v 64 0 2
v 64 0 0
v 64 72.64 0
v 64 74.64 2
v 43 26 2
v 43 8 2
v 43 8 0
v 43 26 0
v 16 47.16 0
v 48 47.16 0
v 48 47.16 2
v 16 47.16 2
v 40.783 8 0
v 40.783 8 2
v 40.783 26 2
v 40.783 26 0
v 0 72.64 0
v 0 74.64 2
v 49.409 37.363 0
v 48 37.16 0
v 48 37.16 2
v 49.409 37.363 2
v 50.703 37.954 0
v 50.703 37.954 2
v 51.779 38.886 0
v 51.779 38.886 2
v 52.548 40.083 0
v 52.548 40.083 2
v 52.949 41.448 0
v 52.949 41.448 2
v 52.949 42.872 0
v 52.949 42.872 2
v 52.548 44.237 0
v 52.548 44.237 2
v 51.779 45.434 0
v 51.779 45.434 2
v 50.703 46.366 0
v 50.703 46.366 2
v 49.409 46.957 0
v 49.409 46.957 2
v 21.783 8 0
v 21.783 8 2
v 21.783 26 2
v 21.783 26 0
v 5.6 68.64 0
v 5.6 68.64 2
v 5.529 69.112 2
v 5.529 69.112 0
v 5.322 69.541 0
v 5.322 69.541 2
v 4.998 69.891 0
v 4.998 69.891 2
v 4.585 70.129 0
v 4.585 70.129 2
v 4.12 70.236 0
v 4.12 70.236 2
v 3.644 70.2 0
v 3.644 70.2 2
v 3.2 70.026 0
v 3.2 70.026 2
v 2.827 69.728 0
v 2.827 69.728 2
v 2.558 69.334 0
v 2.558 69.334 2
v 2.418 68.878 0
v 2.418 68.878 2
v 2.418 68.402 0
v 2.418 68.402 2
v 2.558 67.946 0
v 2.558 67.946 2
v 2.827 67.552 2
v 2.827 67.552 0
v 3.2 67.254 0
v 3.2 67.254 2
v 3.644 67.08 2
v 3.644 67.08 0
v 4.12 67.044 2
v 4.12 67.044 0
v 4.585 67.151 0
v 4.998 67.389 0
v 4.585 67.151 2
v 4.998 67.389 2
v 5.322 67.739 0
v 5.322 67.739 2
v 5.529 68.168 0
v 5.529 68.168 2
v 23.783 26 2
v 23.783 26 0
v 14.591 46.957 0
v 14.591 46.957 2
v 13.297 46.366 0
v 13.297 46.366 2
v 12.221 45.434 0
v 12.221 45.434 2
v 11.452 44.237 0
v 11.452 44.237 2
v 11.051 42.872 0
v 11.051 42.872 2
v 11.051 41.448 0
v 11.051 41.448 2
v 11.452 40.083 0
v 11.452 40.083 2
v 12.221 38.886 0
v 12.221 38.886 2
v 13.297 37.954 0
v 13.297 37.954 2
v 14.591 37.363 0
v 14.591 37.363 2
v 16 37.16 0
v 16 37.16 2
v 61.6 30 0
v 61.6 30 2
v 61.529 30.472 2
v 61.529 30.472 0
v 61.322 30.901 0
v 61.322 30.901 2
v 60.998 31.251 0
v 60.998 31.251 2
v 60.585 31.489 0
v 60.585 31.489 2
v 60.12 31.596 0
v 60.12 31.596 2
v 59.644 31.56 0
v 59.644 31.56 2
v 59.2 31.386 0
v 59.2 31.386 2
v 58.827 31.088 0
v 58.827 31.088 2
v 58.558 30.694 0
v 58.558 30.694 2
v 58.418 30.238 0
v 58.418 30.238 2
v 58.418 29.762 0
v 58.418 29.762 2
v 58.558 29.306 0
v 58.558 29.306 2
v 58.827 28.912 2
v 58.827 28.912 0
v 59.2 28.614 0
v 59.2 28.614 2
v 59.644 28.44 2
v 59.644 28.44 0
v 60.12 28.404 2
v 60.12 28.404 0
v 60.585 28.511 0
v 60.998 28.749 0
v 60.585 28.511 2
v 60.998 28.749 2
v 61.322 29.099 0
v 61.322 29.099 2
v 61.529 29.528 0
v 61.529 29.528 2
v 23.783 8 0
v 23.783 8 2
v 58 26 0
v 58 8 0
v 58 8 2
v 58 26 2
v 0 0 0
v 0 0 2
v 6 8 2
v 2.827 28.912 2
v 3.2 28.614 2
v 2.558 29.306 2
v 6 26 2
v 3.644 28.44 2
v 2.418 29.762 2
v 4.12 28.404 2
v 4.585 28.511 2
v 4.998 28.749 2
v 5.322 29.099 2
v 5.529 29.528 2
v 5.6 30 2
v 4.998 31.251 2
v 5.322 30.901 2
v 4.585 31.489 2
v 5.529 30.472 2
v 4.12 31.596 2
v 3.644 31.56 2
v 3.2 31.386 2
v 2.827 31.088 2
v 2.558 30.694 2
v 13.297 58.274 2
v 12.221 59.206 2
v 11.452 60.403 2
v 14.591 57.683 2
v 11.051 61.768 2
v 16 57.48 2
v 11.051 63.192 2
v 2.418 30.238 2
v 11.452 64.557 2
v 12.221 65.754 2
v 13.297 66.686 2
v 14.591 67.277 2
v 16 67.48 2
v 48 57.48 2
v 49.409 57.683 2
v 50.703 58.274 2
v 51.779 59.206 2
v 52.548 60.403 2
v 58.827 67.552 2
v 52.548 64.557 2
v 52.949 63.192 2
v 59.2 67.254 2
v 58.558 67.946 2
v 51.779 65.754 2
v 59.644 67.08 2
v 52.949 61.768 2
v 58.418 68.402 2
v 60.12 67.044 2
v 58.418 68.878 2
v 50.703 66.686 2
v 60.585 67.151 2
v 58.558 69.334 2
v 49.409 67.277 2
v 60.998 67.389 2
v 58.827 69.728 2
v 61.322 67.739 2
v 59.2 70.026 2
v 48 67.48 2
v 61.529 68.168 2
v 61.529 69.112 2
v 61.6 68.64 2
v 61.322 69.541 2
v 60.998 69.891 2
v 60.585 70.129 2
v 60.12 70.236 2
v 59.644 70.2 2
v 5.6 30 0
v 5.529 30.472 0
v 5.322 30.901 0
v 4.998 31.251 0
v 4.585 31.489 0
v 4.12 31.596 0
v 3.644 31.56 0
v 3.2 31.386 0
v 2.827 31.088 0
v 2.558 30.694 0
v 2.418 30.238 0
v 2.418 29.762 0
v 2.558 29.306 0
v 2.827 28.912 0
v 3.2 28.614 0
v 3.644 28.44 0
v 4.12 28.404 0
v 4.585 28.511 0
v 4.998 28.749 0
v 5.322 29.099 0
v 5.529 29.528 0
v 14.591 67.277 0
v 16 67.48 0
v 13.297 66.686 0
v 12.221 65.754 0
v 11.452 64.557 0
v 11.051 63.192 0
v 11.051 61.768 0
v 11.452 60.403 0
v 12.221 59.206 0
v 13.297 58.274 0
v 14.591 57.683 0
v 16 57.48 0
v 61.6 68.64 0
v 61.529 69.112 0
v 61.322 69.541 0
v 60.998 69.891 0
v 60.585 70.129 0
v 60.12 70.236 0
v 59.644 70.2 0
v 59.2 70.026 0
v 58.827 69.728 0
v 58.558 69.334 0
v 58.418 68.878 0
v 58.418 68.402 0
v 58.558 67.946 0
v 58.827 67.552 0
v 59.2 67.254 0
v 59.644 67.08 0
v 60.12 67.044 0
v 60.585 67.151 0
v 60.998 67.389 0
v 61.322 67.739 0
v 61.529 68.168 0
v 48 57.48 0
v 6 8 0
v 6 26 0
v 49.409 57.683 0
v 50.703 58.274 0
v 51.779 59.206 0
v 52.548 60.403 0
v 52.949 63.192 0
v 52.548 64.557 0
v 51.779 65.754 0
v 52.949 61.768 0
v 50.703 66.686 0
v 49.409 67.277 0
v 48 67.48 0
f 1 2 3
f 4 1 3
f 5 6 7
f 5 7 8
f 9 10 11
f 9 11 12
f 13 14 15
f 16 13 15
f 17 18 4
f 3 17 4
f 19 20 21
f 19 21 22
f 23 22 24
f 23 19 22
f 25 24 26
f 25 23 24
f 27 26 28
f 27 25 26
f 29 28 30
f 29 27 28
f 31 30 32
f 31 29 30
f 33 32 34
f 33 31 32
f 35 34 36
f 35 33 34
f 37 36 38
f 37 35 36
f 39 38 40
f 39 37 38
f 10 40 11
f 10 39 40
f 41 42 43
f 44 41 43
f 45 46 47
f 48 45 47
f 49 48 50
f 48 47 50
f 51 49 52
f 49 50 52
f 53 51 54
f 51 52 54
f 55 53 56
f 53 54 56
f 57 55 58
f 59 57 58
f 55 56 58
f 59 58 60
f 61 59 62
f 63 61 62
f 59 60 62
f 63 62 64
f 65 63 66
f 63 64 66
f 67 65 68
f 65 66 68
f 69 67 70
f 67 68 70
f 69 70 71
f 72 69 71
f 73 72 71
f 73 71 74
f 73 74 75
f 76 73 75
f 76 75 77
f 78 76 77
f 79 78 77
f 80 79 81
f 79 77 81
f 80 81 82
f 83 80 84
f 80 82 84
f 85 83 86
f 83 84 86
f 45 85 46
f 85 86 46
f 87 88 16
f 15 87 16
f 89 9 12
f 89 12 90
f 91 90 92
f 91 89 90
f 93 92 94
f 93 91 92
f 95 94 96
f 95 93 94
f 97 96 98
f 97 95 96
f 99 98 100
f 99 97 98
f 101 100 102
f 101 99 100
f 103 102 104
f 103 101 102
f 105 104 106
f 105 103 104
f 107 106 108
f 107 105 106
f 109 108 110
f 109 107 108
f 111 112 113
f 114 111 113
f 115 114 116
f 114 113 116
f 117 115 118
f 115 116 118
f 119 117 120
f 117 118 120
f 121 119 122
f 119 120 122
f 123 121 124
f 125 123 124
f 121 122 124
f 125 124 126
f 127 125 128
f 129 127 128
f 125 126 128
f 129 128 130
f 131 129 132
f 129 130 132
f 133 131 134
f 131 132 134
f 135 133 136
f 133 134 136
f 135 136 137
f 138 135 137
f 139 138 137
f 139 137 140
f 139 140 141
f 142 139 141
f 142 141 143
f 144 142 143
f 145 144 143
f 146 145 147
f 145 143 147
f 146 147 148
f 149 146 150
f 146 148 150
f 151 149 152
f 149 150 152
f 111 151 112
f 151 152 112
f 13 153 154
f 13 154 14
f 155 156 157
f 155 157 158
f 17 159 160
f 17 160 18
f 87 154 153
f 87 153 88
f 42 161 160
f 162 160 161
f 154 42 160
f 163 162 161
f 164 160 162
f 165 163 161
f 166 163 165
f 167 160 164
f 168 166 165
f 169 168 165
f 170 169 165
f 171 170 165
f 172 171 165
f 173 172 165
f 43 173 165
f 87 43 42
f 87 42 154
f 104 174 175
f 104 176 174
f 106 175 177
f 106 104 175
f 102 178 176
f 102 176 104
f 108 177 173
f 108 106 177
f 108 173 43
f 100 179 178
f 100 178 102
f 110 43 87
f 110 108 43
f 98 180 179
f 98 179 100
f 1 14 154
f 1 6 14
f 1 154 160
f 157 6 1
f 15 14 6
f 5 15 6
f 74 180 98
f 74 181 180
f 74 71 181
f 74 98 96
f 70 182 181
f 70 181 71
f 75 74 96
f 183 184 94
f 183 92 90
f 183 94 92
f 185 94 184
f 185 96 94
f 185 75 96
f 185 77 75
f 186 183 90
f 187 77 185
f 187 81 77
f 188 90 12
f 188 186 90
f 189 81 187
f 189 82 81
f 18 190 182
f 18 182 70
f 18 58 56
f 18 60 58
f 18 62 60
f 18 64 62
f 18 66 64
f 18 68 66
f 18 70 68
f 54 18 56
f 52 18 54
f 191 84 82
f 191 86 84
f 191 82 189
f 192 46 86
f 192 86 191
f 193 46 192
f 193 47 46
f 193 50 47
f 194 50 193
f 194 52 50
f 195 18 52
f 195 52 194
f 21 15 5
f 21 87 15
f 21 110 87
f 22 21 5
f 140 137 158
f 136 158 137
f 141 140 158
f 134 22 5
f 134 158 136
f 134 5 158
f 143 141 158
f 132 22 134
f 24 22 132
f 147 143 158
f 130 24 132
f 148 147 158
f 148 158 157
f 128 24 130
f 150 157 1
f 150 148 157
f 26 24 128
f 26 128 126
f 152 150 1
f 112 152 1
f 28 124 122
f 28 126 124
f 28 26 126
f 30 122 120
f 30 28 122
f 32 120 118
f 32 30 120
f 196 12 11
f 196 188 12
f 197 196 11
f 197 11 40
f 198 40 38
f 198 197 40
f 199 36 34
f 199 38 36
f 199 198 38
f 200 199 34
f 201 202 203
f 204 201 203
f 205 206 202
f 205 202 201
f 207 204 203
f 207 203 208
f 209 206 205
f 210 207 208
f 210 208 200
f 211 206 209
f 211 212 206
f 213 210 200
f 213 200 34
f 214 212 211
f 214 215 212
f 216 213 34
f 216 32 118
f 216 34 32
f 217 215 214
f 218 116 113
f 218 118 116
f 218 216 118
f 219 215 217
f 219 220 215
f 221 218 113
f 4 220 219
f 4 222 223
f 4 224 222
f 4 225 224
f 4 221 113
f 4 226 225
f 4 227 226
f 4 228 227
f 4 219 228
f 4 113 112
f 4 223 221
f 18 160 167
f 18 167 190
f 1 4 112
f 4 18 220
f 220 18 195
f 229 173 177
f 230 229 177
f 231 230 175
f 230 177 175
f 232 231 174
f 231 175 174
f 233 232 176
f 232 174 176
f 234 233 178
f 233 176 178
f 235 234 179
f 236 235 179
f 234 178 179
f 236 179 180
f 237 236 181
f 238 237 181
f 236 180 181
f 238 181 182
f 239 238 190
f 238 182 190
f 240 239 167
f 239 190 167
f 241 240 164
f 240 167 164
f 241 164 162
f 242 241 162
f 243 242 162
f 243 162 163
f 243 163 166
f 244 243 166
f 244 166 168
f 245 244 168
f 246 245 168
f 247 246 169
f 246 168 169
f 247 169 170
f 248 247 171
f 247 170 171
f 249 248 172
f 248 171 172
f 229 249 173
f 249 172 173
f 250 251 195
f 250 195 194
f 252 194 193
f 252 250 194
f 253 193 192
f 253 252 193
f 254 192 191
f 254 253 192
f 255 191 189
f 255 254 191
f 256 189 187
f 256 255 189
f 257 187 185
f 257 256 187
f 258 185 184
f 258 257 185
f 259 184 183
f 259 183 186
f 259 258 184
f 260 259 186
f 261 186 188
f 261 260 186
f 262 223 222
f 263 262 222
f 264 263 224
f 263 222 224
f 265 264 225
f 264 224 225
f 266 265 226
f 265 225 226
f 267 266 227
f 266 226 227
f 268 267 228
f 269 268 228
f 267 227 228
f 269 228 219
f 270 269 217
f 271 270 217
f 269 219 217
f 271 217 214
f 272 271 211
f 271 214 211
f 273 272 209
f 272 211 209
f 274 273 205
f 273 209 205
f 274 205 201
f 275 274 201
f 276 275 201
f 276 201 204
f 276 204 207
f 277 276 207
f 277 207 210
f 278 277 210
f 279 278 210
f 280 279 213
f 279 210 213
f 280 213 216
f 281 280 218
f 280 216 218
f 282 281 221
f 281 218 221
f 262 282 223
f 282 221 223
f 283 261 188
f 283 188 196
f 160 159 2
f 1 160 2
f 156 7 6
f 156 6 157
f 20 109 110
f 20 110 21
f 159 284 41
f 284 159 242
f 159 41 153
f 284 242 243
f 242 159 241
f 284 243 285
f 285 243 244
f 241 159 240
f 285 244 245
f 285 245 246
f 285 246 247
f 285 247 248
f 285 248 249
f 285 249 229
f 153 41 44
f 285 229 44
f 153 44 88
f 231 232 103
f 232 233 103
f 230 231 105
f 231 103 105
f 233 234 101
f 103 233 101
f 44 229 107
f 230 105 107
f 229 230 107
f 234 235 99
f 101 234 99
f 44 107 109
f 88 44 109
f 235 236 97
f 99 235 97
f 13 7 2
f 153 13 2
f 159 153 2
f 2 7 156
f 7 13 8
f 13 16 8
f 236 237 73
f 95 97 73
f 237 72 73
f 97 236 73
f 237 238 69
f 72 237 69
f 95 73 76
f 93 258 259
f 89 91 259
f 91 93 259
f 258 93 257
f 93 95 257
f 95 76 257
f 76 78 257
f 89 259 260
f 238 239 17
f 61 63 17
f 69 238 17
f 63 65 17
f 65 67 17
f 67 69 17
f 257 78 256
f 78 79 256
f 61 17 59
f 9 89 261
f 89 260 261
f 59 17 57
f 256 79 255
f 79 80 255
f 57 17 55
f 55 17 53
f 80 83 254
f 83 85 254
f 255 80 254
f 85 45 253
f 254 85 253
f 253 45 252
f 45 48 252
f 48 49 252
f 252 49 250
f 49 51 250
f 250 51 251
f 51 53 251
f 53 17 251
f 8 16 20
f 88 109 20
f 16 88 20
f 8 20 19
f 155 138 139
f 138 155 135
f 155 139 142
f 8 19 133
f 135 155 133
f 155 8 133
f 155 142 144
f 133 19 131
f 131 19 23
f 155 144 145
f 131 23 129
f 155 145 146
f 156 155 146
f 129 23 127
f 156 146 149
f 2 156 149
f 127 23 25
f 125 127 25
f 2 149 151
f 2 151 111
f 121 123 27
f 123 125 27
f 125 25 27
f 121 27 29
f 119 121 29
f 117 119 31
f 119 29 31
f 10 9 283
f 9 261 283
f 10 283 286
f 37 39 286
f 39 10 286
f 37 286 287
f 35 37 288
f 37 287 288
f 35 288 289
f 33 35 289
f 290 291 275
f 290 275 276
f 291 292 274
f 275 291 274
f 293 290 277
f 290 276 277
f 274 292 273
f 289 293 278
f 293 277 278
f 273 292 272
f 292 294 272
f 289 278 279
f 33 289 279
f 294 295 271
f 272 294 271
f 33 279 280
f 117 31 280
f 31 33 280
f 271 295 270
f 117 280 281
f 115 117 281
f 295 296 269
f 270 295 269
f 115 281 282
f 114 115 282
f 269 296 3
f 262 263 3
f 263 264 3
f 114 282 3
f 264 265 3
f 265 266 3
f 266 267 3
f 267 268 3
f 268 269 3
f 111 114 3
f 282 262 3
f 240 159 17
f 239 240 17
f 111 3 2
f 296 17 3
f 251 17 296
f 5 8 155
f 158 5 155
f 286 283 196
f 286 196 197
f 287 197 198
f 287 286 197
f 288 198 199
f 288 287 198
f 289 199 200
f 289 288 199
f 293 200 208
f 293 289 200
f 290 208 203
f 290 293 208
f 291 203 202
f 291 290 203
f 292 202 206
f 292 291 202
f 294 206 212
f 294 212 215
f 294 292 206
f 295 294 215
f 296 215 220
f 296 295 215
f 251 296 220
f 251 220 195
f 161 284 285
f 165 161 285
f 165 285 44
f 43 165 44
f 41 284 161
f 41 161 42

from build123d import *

# Parameters (mm, degrees)
SZKIC1_W                    = 64
SZKIC1_H                    = 72.64
SZKIC1_W_2                  = 52
SZKIC1_H_2                  = 18
SZKIC1_H_3                  = 2
DODANIE_WYCI_GNI_CIE1_DEPTH = 2
SFAZOWANIE1_SIZE            = 2
SZKIC2_R                    = 1.6
WYTNIJ_WYCI_GNI_CIE1_DEPTH  = 2
SZKIC3_W                    = 2.216566571
SZKIC3_H                    = 18
SZKIC3_W_2                  = 2
DODANIE_WYCI_GNI_CIE2_DEPTH = 2
WYTNIJ_WYCI_GNI_CIE2_DEPTH  = 2


with BuildPart() as part:
    # Szkic1 → Dodanie-wyciągnięcie1 (new body)
    # profile 1 of 2: a face of its own
    with BuildSketch(Plane.XY):
        with Locations((32, 36.32)):
            Rectangle(SZKIC1_W, SZKIC1_H)
        with Locations((32, 17)):
            Rectangle(SZKIC1_W_2, SZKIC1_H_2, mode=Mode.SUBTRACT)
    # profile 2 of 2: a face of its own
    with BuildSketch(Plane.XY):
        with Locations((32, 73.64)):
            Rectangle(SZKIC1_W, SZKIC1_H_3)
    extrude(amount=DODANIE_WYCI_GNI_CIE1_DEPTH)

    # Sfazowanie1
    sfazowanie1_edges = [part.edges().sort_by_distance(p)[0] for p in [
        (32, 74.64, 0),
    ]]
    chamfer(sfazowanie1_edges, length=SFAZOWANIE1_SIZE - 0.0001)  # a hair under: the kernel refuses the full size

    # Szkic2 → Wytnij-wyciągnięcie1 (cut)
    with BuildSketch(Plane.XY.offset(2)):
        with Locations((4, 30)):
            Circle(SZKIC2_R)
        with Locations((60, 30)):
            Circle(SZKIC2_R)
        with Locations((4, 68.64)):
            Circle(SZKIC2_R)
        with Locations((60, 68.64)):
            Circle(SZKIC2_R)
    extrude(amount=-WYTNIJ_WYCI_GNI_CIE1_DEPTH, mode=Mode.SUBTRACT)

    # Szkic3 → Dodanie-wyciągnięcie2 (add)
    with BuildSketch(Plane.XY.offset(2)):
        with Locations((41.891716715, 17)):
            Rectangle(SZKIC3_W, SZKIC3_H)
        with Locations((22.783433429, 17)):
            Rectangle(SZKIC3_W_2, SZKIC3_H)
    extrude(amount=-DODANIE_WYCI_GNI_CIE2_DEPTH)

    # Szkic4 → Wytnij-wyciągnięcie2 (cut)
    with BuildSketch(Plane(origin=(0, 0, 0), x_dir=(-1, 0, 0), z_dir=(0, 0, -1))):
        with BuildLine():
            Line((-48, 47.16), (-16, 47.16))
            ThreePointArc((-16, 47.16), (-11, 42.16), (-16, 37.16))
            Line((-16, 37.16), (-48, 37.16))
            ThreePointArc((-48, 37.16), (-53, 42.16), (-48, 47.16))
        make_face()
        with BuildLine():
            Line((-48, 67.48), (-16, 67.48))
            ThreePointArc((-16, 67.48), (-11, 62.48), (-16, 57.48))
            Line((-16, 57.48), (-48, 57.48))
            ThreePointArc((-48, 57.48), (-53, 62.48), (-48, 67.48))
        make_face()
    extrude(amount=-WYTNIJ_WYCI_GNI_CIE2_DEPTH, mode=Mode.SUBTRACT)


solid = part.part
